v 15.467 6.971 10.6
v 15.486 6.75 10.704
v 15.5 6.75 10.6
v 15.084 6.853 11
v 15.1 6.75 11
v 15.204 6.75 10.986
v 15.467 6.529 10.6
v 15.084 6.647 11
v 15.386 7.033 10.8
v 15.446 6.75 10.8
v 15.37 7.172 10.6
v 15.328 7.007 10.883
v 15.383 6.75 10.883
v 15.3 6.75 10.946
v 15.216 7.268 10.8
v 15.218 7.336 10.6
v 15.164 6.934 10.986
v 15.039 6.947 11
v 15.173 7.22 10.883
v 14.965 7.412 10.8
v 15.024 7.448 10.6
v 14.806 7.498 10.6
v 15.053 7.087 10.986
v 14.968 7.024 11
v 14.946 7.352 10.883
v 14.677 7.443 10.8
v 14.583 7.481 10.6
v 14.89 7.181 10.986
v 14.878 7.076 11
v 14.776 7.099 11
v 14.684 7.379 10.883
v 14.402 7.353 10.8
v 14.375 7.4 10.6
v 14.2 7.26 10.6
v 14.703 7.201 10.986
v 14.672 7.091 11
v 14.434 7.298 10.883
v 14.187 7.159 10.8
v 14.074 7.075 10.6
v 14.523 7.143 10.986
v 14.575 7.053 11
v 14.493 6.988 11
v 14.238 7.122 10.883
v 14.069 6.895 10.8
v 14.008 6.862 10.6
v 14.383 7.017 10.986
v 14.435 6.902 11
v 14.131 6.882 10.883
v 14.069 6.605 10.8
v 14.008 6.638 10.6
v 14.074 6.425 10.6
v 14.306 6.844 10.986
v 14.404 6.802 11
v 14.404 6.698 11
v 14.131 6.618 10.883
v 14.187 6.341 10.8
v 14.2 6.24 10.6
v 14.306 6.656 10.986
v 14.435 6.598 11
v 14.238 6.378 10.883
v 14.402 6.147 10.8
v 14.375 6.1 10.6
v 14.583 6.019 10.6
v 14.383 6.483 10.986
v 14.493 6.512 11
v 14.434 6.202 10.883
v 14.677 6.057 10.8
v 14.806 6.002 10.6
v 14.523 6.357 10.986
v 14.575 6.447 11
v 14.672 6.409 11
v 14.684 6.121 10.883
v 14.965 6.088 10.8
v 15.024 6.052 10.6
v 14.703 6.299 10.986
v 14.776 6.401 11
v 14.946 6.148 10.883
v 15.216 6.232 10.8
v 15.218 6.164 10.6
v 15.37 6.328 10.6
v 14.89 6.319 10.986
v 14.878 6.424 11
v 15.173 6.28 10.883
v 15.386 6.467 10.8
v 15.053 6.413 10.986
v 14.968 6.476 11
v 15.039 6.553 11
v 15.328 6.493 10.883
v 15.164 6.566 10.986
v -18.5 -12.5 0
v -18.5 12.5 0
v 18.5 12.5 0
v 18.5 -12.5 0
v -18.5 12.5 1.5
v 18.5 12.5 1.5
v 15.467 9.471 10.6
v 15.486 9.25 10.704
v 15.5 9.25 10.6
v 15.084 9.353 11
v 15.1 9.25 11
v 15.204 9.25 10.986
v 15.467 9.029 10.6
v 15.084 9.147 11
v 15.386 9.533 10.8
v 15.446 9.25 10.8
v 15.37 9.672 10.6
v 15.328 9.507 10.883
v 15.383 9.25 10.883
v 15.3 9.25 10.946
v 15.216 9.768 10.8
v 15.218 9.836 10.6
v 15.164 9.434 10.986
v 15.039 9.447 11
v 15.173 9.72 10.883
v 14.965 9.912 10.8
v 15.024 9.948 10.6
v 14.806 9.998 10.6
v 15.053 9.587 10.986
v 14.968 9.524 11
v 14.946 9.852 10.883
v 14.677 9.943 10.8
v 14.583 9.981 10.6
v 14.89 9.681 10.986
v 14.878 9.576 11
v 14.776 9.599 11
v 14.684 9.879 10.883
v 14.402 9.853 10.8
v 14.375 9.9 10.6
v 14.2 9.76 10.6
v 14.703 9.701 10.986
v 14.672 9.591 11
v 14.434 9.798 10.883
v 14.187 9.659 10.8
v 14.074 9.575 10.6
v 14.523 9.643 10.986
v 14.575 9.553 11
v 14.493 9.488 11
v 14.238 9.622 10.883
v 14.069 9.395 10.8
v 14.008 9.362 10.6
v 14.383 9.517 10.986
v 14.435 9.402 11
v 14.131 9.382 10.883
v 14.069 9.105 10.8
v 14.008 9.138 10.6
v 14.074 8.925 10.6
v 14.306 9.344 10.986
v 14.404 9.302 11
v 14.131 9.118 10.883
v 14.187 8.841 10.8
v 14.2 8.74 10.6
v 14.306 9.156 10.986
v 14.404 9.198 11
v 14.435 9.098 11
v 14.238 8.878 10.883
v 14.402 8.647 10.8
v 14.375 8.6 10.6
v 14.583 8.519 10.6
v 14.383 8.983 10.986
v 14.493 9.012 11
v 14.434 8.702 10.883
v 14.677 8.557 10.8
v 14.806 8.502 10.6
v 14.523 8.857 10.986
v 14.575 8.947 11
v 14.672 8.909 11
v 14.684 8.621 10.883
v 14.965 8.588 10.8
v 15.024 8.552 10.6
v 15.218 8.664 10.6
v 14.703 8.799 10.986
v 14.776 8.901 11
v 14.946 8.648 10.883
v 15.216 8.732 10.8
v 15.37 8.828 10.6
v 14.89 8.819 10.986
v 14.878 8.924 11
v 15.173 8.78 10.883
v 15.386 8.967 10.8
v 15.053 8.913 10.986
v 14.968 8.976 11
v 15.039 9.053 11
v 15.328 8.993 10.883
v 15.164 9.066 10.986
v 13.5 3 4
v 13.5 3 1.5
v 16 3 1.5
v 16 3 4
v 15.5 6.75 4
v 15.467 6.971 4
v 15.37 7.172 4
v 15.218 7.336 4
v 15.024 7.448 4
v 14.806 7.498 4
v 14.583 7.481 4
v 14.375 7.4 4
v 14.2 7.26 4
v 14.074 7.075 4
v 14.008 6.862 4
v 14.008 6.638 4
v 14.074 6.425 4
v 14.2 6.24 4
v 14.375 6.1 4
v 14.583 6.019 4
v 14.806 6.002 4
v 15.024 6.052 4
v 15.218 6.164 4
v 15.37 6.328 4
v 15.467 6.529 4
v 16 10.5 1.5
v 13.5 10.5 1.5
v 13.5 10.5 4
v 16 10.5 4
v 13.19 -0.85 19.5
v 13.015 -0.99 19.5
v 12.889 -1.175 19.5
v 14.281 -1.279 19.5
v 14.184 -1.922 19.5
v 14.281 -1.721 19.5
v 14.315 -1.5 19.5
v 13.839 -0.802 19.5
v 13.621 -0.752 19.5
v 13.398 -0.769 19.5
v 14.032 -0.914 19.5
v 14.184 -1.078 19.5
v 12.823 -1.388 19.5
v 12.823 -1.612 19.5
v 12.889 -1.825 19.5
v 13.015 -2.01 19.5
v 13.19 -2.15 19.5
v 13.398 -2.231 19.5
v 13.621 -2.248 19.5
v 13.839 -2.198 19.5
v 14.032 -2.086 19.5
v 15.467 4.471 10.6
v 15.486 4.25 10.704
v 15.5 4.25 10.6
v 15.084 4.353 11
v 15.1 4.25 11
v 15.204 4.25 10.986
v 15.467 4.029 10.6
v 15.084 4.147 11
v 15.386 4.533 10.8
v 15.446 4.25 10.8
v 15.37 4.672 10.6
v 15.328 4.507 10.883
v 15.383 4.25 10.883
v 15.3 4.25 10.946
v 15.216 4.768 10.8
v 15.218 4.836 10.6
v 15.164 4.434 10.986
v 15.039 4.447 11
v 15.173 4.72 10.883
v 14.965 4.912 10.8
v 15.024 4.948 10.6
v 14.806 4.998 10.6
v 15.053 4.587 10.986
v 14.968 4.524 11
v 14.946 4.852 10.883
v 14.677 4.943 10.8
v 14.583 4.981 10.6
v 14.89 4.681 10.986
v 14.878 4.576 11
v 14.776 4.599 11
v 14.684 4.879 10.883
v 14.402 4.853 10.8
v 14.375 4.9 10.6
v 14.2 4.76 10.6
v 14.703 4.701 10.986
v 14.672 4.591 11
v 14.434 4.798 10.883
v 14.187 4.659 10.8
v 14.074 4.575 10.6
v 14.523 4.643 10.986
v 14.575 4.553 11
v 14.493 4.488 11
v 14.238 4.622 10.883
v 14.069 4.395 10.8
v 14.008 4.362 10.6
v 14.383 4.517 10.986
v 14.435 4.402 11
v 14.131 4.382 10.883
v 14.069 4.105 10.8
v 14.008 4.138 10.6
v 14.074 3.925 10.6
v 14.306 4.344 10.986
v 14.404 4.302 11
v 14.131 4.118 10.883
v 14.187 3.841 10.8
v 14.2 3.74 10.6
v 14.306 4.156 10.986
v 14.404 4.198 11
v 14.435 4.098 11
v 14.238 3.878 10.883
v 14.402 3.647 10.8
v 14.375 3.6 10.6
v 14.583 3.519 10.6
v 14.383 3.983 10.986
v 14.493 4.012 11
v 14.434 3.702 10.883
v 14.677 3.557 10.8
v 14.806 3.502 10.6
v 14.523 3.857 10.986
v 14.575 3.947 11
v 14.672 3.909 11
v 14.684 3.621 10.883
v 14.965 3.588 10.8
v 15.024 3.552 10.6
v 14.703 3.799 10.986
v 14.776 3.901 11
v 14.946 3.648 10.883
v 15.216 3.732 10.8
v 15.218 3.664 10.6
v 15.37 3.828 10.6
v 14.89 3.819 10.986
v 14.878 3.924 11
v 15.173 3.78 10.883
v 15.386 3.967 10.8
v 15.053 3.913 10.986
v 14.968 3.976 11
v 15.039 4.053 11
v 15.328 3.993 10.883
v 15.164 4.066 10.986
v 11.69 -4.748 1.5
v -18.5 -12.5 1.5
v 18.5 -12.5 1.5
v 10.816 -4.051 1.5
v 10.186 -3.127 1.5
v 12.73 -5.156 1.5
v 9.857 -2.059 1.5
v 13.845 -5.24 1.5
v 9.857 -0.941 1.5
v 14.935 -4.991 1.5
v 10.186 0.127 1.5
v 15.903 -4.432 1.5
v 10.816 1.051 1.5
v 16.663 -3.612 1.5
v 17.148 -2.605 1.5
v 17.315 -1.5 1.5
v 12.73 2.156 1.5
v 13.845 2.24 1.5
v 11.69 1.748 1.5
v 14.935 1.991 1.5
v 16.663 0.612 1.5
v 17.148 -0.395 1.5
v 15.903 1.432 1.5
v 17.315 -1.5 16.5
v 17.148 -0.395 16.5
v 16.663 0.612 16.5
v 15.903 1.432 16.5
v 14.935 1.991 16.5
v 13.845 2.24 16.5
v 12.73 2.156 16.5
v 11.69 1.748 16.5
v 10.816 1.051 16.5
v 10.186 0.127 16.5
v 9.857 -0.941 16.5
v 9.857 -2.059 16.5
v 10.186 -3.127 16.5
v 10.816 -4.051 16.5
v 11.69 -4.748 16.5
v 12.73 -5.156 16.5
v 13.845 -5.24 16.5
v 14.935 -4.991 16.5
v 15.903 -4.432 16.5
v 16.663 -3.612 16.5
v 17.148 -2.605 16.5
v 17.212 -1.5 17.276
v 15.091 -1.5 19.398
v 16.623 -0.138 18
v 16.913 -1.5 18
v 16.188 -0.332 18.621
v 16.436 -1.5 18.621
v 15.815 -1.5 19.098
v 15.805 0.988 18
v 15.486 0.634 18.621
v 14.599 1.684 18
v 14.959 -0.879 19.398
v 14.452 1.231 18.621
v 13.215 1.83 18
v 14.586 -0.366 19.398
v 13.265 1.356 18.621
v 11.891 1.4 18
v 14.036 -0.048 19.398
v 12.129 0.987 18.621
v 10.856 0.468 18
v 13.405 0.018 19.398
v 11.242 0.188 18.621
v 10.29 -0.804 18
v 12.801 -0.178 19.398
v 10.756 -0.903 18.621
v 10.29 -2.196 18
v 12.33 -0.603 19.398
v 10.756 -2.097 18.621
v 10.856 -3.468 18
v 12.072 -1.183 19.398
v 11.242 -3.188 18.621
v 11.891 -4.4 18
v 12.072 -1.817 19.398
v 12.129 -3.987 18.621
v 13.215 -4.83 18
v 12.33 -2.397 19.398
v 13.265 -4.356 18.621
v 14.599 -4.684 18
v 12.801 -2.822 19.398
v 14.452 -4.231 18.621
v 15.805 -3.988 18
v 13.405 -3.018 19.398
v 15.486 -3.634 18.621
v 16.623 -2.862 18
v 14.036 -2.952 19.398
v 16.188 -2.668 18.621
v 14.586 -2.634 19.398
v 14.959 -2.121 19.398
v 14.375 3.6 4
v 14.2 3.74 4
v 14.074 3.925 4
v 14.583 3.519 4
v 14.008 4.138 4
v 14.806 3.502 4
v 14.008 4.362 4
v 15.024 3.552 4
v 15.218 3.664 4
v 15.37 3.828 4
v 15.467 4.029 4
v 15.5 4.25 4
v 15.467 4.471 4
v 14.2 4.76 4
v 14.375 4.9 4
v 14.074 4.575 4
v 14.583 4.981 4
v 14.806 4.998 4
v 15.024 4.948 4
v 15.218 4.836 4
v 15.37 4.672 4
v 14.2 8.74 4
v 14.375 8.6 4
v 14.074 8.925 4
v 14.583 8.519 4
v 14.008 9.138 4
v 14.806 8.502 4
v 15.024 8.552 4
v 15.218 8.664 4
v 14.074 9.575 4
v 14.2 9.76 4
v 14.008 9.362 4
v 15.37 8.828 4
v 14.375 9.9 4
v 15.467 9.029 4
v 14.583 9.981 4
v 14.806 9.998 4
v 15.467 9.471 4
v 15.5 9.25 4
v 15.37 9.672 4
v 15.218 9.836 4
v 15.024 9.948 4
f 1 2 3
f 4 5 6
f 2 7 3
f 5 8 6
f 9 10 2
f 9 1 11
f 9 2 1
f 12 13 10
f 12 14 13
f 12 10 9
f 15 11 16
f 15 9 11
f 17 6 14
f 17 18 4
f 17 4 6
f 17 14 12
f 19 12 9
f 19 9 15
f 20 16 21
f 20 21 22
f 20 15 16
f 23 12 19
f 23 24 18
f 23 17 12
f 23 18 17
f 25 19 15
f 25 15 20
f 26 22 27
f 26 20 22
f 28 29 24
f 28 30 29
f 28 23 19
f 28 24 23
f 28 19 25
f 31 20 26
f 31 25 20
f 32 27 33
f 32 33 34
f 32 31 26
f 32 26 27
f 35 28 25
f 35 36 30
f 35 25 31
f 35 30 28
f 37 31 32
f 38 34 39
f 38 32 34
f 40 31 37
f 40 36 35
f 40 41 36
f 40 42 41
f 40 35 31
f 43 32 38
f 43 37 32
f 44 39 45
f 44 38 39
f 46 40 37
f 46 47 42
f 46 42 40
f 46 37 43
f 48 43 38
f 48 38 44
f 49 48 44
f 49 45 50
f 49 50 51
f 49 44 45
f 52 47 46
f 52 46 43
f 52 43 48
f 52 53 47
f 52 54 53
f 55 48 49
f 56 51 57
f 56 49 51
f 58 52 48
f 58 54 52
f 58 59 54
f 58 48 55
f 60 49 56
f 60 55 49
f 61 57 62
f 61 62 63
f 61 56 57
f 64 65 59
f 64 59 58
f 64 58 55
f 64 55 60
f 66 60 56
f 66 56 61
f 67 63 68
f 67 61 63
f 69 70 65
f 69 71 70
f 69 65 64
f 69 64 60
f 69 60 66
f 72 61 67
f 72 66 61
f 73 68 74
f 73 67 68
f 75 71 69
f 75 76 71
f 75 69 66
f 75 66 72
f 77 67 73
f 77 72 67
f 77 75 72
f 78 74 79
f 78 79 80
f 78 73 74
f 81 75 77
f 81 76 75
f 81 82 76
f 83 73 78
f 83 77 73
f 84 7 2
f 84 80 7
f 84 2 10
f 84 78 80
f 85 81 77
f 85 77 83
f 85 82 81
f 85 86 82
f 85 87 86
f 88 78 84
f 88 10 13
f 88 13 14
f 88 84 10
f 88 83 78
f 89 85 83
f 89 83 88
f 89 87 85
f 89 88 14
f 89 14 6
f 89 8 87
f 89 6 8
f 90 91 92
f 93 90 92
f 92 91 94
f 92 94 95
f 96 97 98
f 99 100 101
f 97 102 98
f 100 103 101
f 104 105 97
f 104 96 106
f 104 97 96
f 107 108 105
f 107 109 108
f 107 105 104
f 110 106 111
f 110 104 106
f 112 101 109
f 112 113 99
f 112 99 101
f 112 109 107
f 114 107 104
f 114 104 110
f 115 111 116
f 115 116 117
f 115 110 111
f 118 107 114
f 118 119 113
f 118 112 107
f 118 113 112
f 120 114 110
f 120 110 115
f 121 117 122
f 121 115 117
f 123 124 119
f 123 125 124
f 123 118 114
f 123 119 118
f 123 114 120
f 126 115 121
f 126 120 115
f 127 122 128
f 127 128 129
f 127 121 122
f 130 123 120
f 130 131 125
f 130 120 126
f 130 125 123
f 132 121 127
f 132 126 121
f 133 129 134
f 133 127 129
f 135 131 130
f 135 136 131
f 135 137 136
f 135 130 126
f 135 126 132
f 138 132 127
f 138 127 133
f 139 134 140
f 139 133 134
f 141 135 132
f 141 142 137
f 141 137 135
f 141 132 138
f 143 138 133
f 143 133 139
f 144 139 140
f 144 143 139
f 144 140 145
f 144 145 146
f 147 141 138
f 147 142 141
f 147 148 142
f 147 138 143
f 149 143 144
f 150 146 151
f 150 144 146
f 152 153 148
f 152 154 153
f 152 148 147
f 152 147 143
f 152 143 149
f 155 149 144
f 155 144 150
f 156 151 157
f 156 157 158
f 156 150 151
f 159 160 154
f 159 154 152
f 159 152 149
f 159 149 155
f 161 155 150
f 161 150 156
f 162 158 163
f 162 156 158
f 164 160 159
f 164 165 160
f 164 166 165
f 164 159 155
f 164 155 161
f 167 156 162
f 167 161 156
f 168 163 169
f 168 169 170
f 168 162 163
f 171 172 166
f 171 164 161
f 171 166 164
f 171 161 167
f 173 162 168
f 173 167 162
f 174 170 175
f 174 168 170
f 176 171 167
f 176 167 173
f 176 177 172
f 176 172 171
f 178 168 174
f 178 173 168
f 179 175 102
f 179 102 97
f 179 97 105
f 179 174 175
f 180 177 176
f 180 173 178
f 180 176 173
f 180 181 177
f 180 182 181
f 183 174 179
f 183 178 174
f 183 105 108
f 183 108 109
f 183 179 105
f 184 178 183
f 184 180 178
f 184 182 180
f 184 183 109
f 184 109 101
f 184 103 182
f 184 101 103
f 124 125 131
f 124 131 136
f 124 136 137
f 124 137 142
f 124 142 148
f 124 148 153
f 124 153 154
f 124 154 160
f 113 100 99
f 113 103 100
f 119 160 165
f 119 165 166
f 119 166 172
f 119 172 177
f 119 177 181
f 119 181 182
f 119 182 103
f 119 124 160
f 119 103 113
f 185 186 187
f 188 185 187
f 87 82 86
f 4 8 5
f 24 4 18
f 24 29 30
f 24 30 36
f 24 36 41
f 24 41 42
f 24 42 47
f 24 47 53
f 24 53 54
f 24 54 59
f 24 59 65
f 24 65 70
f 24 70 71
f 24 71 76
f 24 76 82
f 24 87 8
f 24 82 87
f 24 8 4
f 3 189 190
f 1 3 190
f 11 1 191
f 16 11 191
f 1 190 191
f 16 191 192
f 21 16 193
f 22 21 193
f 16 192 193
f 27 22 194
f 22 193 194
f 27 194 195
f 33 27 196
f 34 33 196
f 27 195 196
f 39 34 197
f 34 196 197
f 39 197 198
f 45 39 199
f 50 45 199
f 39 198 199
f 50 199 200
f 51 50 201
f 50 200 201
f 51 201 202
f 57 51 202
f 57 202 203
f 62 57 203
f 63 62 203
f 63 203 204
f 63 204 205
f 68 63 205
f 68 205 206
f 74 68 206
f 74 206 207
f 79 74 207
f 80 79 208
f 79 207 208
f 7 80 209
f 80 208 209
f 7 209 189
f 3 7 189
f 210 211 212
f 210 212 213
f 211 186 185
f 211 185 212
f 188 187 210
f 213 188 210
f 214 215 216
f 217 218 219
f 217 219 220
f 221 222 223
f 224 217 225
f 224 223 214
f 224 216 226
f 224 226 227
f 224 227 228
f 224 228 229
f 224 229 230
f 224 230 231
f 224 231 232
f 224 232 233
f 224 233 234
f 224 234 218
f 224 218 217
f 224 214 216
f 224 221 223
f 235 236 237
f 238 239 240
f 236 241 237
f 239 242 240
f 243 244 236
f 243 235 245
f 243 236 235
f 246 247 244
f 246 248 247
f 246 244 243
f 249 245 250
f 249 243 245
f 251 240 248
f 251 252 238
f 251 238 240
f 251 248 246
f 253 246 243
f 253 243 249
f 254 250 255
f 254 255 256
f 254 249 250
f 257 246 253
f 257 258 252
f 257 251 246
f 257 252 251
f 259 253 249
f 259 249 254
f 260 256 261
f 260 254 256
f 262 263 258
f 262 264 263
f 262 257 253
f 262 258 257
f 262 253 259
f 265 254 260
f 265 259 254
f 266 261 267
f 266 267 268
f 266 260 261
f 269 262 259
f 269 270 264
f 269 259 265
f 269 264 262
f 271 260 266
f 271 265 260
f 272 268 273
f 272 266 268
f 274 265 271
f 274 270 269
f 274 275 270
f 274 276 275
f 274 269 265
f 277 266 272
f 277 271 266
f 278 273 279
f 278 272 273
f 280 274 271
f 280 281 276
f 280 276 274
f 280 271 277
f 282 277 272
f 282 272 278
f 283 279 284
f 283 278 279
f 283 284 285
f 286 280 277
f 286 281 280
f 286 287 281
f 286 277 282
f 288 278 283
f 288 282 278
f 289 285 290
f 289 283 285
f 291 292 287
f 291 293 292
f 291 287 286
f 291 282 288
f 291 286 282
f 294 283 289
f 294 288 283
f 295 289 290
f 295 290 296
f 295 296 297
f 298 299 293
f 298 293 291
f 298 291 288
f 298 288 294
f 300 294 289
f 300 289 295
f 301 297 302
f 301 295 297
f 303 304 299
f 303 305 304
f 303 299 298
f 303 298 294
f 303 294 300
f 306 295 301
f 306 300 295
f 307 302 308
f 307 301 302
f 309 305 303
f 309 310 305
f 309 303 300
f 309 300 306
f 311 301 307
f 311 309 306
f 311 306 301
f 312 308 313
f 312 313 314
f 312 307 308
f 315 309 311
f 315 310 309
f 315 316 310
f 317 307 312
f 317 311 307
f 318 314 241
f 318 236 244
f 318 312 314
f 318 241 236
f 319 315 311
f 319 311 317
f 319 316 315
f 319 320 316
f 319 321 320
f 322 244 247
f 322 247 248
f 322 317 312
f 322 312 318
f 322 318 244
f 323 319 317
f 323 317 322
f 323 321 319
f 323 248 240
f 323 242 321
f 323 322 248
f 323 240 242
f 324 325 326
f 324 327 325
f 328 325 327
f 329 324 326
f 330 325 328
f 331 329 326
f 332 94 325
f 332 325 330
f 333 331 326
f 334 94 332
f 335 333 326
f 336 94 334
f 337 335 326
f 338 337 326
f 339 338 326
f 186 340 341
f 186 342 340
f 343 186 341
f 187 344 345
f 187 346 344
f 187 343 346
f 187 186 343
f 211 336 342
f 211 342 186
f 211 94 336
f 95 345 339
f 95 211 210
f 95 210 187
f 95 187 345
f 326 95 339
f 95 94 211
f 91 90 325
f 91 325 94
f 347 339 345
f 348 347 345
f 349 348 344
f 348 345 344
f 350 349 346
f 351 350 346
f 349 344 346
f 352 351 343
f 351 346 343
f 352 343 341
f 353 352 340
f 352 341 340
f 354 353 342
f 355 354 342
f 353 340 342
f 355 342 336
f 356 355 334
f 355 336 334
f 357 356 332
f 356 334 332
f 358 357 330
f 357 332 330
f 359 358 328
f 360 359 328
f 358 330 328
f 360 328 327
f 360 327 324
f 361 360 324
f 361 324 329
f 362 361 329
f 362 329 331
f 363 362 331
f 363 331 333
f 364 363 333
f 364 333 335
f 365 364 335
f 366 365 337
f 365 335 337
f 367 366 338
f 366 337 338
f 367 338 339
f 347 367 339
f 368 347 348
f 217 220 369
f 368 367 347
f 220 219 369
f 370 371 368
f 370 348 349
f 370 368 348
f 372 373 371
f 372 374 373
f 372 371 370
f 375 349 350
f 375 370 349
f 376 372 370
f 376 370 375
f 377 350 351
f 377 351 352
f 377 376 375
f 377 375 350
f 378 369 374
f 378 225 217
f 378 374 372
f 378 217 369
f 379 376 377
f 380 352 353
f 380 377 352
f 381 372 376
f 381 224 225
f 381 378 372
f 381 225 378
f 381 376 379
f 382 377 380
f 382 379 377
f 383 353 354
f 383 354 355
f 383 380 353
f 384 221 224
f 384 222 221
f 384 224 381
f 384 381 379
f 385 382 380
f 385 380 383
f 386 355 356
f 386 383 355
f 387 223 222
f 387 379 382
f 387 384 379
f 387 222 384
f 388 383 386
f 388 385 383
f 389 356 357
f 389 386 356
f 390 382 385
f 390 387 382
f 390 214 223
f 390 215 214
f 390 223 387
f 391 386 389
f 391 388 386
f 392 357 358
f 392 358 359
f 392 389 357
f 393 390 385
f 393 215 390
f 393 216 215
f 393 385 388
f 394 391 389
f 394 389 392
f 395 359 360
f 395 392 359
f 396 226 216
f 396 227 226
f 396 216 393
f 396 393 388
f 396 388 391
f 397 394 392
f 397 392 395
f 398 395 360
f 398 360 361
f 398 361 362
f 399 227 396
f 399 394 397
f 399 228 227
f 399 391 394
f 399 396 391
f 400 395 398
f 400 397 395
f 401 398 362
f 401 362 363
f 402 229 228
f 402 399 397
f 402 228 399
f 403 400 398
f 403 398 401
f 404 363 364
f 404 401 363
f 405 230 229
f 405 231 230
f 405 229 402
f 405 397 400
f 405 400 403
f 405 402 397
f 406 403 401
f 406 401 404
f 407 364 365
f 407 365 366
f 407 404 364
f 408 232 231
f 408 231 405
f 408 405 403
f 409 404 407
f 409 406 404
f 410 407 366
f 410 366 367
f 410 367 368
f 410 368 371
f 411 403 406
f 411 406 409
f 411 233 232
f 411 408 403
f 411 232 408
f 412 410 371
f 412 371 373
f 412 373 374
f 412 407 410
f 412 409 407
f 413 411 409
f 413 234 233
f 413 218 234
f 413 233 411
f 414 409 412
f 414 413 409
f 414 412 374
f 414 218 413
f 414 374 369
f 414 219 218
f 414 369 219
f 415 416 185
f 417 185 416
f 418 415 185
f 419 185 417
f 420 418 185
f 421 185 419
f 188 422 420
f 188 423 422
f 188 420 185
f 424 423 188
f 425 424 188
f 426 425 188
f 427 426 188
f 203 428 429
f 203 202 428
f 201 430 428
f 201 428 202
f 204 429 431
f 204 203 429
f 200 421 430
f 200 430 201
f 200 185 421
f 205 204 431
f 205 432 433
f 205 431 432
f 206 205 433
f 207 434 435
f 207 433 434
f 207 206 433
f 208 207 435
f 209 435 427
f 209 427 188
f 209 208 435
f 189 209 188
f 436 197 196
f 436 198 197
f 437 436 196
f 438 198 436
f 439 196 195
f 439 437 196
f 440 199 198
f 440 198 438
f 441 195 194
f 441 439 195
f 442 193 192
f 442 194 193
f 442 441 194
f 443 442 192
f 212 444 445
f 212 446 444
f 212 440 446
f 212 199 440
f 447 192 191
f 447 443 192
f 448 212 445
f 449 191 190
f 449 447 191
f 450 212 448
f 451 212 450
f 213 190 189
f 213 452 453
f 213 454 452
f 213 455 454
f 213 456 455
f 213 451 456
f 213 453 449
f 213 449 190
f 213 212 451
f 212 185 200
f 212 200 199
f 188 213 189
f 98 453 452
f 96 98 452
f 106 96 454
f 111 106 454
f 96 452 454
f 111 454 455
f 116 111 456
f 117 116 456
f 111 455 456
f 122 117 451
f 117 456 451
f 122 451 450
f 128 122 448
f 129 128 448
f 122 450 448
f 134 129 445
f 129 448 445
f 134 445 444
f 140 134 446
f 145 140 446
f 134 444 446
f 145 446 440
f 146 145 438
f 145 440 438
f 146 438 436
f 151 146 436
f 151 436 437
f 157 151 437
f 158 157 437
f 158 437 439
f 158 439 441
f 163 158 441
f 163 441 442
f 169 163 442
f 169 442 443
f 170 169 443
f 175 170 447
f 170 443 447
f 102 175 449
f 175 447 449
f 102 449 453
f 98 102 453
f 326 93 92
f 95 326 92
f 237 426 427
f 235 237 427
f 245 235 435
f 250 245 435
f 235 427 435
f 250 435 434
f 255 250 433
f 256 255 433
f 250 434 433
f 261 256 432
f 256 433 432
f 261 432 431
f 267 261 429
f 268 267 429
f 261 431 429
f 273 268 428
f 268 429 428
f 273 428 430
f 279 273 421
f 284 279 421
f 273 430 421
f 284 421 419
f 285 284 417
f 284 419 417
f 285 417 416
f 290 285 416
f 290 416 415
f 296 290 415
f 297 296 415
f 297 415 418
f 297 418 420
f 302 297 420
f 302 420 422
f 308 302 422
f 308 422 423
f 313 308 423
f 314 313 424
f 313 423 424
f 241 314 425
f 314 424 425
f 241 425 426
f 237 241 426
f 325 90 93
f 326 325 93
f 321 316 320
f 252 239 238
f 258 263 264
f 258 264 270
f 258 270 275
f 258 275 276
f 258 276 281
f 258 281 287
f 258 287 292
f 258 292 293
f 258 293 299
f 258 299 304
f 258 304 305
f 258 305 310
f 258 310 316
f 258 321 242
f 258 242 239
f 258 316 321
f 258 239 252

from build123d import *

# Parameters (mm, degrees)
SKIZZE1_W                       = 37
SKIZZE1_H                       = 25
AUFSATZ_LINEAR_AUSTRAGEN1_DEPTH = 1.5
SKIZZE3_R                       = 3.75
AUFSATZ_LINEAR_AUSTRAGEN2_DEPTH = 18
VERRUNDUNG1_R                   = 3
SKIZZE5_W                       = 2.5
SKIZZE5_H                       = 7.5
AUFSATZ_LINEAR_AUSTRAGEN3_DEPTH = 2.5
SKIZZE6_R                       = 0.75
AUFSATZ_LINEAR_AUSTRAGEN4_DEPTH = 7
LINEARES_MUSTER1_COUNT          = 3
LINEARES_MUSTER1_PITCH          = 2.5
VERRUNDUNG2_R                   = 0.4


with BuildPart() as part:
    # Skizze1 → Aufsatz-Linear austragen1 (new body)
    with BuildSketch(Plane.XY):
        Rectangle(SKIZZE1_W, SKIZZE1_H)
    extrude(amount=AUFSATZ_LINEAR_AUSTRAGEN1_DEPTH)

    # Skizze3 → Aufsatz-Linear austragen2 (add)
    with BuildSketch(Plane.XY.offset(1.5)):
        with Locations((13.564667913, -1.5)):
            Circle(SKIZZE3_R)
    extrude(amount=AUFSATZ_LINEAR_AUSTRAGEN2_DEPTH)

    # Verrundung1
    verrundung1_edges = [part.edges().sort_by_distance(p)[0] for p in [
        (9.814667913, -1.5, 19.5),
    ]]
    fillet(verrundung1_edges, radius=VERRUNDUNG1_R)



with BuildPart() as body_2:
    # Skizze5 → Aufsatz-Linear austragen3 (new body)
    with BuildSketch(Plane.XY.offset(1.5)):
        with Locations((14.75, 6.75)):
            Rectangle(SKIZZE5_W, SKIZZE5_H)
    extrude(amount=AUFSATZ_LINEAR_AUSTRAGEN3_DEPTH)


with BuildPart() as part_1:
    add(part.part)

    add(body_2.part)  # Aufsatz-Linear austragen4 merges body 2
    # Skizze6 → Aufsatz-Linear austragen4 (add)
    with BuildSketch(Plane.XY.offset(4)):
        with Locations((14.75, 9.25)):
            Circle(SKIZZE6_R)
    aufsatz_linear_austragen4 = extrude(amount=AUFSATZ_LINEAR_AUSTRAGEN4_DEPTH)

    # Lineares Muster1: Aufsatz-Linear austragen4 ×3
    with Locations(*[(0, -i * LINEARES_MUSTER1_PITCH, 0) for i in range(1, LINEARES_MUSTER1_COUNT)]):
        add(aufsatz_linear_austragen4)

    # Verrundung2
    verrundung2_edges = [part_1.edges().sort_by_distance(p)[0] for p in [
        (14, 9.25, 11),
        (14, 6.75, 11),
        (14, 4.25, 11),
    ]]
    fillet(verrundung2_edges, radius=VERRUNDUNG2_R)


solid = part_1.part
